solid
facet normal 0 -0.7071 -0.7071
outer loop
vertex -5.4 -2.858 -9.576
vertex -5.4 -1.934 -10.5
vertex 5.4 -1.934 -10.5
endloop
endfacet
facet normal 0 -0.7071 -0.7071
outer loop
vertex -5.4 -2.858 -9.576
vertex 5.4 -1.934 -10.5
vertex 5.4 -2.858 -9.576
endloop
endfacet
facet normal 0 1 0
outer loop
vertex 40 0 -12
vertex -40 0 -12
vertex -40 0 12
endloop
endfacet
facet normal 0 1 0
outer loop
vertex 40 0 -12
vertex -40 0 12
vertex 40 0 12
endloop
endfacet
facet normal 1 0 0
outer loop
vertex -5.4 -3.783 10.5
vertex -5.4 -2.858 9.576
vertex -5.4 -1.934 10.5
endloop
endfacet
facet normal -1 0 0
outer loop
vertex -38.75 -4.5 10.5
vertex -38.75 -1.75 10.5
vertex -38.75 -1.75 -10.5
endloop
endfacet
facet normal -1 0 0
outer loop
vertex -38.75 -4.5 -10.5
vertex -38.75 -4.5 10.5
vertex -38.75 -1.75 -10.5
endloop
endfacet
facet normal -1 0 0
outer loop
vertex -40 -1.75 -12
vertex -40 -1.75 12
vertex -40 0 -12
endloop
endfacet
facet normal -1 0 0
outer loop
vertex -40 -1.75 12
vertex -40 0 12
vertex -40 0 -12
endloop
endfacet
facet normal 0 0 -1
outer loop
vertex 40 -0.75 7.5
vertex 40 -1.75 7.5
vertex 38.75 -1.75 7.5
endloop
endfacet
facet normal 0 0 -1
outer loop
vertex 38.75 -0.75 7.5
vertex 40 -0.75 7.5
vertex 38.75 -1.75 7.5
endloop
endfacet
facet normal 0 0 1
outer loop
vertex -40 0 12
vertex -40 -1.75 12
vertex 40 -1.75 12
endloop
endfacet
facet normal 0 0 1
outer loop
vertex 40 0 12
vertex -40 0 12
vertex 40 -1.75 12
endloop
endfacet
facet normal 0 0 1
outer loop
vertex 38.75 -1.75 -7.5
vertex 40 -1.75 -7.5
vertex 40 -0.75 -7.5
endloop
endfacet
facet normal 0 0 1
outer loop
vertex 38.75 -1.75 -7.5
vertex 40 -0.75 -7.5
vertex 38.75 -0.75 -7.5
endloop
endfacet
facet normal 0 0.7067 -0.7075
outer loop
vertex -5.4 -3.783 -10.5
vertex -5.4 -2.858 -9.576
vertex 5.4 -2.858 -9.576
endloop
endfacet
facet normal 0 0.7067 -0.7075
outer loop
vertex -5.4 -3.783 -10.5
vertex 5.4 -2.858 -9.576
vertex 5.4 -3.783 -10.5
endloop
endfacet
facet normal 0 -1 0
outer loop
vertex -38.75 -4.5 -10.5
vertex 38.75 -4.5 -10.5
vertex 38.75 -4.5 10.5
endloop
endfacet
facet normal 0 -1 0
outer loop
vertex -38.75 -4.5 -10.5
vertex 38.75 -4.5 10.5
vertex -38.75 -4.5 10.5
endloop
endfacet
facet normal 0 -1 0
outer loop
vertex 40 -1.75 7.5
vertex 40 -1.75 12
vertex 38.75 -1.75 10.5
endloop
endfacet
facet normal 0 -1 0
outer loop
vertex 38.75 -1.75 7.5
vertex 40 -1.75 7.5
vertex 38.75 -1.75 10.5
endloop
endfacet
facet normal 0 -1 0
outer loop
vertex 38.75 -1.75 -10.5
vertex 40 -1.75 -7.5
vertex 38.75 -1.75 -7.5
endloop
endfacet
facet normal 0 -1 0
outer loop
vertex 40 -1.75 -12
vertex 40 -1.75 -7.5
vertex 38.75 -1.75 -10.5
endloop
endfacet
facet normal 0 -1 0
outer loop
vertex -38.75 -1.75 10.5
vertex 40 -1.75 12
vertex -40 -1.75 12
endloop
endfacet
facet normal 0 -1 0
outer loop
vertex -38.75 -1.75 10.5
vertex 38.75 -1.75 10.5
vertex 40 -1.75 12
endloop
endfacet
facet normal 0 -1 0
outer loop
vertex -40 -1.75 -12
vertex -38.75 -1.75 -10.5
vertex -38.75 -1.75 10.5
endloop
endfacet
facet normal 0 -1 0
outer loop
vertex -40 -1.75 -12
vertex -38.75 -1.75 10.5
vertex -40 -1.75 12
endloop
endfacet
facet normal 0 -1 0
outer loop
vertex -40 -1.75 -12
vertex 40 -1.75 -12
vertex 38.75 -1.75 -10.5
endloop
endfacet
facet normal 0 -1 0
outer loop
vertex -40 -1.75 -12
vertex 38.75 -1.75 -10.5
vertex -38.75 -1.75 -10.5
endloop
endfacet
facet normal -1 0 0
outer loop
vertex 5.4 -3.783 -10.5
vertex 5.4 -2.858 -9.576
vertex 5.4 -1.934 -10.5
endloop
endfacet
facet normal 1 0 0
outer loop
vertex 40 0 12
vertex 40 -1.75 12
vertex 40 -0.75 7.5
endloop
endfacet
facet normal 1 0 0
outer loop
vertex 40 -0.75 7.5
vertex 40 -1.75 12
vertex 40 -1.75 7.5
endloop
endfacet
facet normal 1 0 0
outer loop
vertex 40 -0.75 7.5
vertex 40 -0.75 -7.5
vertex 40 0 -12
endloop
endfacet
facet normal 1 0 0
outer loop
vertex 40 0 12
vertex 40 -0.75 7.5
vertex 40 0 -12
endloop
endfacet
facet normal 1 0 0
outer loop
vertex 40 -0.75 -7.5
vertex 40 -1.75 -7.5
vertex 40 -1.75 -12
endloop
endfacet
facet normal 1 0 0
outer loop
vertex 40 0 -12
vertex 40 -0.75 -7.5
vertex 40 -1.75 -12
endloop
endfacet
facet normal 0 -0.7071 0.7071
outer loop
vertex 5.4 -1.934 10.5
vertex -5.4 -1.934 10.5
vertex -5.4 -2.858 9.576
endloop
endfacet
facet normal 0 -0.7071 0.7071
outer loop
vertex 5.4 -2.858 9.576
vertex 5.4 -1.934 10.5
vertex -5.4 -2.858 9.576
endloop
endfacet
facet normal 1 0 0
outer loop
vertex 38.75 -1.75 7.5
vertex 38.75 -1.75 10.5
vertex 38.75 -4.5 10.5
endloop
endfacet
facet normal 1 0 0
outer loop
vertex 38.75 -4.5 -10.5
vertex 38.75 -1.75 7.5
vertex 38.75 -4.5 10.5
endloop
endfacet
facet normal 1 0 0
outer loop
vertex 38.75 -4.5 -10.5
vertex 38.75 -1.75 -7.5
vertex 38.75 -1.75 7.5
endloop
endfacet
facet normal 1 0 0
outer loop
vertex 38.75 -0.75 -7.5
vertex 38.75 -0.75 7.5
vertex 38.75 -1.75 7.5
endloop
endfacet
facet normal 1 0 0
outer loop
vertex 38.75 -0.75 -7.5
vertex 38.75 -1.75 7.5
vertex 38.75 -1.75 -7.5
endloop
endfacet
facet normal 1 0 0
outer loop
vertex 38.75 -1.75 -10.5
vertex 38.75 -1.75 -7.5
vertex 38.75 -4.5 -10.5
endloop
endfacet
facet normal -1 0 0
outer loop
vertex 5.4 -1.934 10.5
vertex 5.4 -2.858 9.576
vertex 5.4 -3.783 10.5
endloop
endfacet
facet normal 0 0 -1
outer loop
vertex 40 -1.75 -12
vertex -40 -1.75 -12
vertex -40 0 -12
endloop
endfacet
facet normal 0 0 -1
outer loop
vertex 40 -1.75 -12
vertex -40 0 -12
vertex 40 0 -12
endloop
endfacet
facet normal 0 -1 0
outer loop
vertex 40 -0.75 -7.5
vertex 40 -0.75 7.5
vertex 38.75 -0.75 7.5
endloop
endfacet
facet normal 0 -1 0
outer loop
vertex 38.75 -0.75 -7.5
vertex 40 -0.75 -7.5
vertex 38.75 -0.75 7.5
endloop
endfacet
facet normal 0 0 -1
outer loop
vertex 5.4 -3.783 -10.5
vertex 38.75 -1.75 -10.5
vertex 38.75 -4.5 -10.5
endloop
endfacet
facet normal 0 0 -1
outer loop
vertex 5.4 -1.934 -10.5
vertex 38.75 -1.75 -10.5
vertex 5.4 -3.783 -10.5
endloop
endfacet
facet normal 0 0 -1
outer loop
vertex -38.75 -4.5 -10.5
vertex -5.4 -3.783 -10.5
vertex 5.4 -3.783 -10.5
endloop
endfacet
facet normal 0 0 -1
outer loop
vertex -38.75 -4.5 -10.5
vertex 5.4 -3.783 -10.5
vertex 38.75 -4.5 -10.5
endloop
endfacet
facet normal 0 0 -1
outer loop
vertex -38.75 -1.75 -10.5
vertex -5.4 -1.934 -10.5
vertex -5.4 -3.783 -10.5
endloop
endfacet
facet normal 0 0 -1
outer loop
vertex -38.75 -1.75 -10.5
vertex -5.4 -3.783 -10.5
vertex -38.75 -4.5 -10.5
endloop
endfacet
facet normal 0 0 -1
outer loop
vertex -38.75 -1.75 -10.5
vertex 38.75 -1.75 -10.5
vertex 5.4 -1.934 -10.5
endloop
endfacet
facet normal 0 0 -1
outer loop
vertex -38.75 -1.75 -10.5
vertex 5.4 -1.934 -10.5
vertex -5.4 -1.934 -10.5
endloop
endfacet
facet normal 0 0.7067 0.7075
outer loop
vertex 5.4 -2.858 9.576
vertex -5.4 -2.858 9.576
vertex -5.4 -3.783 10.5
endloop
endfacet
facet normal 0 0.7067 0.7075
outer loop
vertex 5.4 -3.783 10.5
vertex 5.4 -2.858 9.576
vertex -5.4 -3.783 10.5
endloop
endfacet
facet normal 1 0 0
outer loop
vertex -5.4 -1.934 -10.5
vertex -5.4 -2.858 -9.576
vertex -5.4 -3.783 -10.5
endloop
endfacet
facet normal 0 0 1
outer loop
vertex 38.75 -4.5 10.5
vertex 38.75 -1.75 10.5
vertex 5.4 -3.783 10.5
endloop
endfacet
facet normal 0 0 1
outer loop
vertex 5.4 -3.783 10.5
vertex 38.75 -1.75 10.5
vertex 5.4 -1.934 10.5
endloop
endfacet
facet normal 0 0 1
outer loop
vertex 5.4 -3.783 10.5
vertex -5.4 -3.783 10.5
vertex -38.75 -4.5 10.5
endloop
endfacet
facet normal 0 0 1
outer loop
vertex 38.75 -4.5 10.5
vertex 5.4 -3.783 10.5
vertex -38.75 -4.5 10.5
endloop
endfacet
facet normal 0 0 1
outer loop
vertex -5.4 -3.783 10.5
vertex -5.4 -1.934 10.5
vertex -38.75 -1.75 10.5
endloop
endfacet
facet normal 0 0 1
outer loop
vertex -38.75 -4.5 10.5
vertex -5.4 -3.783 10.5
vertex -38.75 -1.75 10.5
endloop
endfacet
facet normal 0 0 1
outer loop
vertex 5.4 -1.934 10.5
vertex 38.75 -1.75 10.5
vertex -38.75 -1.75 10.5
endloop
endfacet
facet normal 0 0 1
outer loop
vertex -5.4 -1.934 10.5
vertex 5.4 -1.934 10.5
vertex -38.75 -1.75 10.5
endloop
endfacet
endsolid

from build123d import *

# Parameters (mm, degrees)
SKETCH1_W           = 80
SKETCH1_H           = 25
BOSS_EXTRUDE1_DEPTH = 1.75
SKETCH2_W           = 77.5
SKETCH2_H           = 21
BOSS_EXTRUDE3_DEPTH = 2.75
CAVITY1_START       = -40
CAVITY1_OUTLINE_W   = 1.75
CAVITY1_OUTLINE_H   = 25
CAVITY1_DEPTH       = 80
CAVITY1_START_2     = -5
CAVITY1_2_DEPTH     = 10
CUT_EXTRUDE1_START  = -0.4
CUT_EXTRUDE1_DEPTH  = 10.8
SKETCH5_W           = 80
SKETCH5_H           = 24
BOSS_EXTRUDE4_DEPTH = 1.75
SKETCH7_W           = 1.25
SKETCH7_H           = 15
CUT_EXTRUDE2_DEPTH  = 1
SKETCH8_W           = 1.25
SKETCH8_H           = 15
BOSS_EXTRUDE5_DEPTH = 1


# Read off the part's stored shape, not the designer's step: Cavity1
with BuildPart() as part:
    # Sketch1 → Boss-Extrude1 (new body)
    with BuildSketch(Plane(origin=(0, 0, 0), x_dir=(1, 0, 0), z_dir=(0, 1, 0))):
        Rectangle(SKETCH1_W, SKETCH1_H)
    extrude(amount=-BOSS_EXTRUDE1_DEPTH)

    # Sketch2 → Boss-Extrude3 (add)
    with BuildSketch(Plane(origin=(0, -1.75, 0), x_dir=(-1, 0, 0), z_dir=(0, -1, 0))):
        Rectangle(SKETCH2_W, SKETCH2_H)
    extrude(amount=BOSS_EXTRUDE3_DEPTH)

    # Cavity1 outline → Cavity1 (cut)
    with BuildSketch(Plane.YZ.offset(CAVITY1_START)):
        with Locations((-0.875, 0)):
            Rectangle(CAVITY1_OUTLINE_W, CAVITY1_OUTLINE_H)
    extrude(amount=CAVITY1_DEPTH, mode=Mode.SUBTRACT)

    # Cavity1 2 outline → Cavity1 2 (cut)
    with BuildSketch(Plane.YZ.offset(CAVITY1_START_2)):
        with BuildLine():
            Line((-2.717157288, 10.282842712), (-2.5, 10.5))
            Line((-2.5, 10.5), (-3.5, 10.5))
            Line((-3.5, 10.5), (-3.282842712, 10.282842712))
            ThreePointArc((-3.282842712, 10.282842712), (-3, 10.165685425), (-2.717157288, 10.282842712))
        make_face()
        with BuildLine():
            Line((-3.5, -10.5), (-2.5, -10.5))
            Line((-2.5, -10.5), (-2.717157288, -10.282842712))
            ThreePointArc((-2.717157288, -10.282842712), (-3, -10.165685425), (-3.282842712, -10.282842712))
            Line((-3.282842712, -10.282842712), (-3.5, -10.5))
        make_face()
    extrude(amount=CAVITY1_2_DEPTH, mode=Mode.SUBTRACT)

    # Sketch4 → Cut-Extrude1 (cut)
    with BuildSketch(Plane(origin=(-5, 0, 0), x_dir=(0, 0, -1), z_dir=(1, 0, 0)).offset(CUT_EXTRUDE1_START)):
        Polygon((-10.800137225, -1.63417735), (-9.57584768, -2.858466895), (-10.943501518, -4.226511252), align=None)
    cut_extrude1 = extrude(amount=CUT_EXTRUDE1_DEPTH, mode=Mode.SUBTRACT)

    # Mirror1: Cut-Extrude1 across plane
    add(cut_extrude1.mirror(Plane.XY), mode=Mode.SUBTRACT)

    # Sketch5 → Boss-Extrude4 (add)
    with BuildSketch(Plane(origin=(0, -1.75, 0), x_dir=(1, 0, 0), z_dir=(0, 1, 0))):
        Rectangle(SKETCH5_W, SKETCH5_H)
    extrude(amount=BOSS_EXTRUDE4_DEPTH)

    # Sketch7 → Cut-Extrude2 (cut)
    with BuildSketch(Plane.XZ.offset(1.75)):
        with Locations((-39.375, 0)):
            Rectangle(SKETCH7_W, SKETCH7_H)
    cut_extrude2 = extrude(amount=-CUT_EXTRUDE2_DEPTH, mode=Mode.SUBTRACT)

    # Mirror2: Cut-Extrude2 across plane
    add(cut_extrude2.mirror(Plane(origin=(0, 0, 0), x_dir=(0, 0, 1), z_dir=(1, 0, 0))), mode=Mode.SUBTRACT)

    # Sketch8 → Boss-Extrude5 (add)
    with BuildSketch(Plane(origin=(0, -0.75, 0), x_dir=(-1, 0, 0), z_dir=(0, -1, 0))):
        with Locations((39.375, 0)):
            Rectangle(SKETCH8_W, SKETCH8_H)
    extrude(amount=BOSS_EXTRUDE5_DEPTH)


solid = part.part
